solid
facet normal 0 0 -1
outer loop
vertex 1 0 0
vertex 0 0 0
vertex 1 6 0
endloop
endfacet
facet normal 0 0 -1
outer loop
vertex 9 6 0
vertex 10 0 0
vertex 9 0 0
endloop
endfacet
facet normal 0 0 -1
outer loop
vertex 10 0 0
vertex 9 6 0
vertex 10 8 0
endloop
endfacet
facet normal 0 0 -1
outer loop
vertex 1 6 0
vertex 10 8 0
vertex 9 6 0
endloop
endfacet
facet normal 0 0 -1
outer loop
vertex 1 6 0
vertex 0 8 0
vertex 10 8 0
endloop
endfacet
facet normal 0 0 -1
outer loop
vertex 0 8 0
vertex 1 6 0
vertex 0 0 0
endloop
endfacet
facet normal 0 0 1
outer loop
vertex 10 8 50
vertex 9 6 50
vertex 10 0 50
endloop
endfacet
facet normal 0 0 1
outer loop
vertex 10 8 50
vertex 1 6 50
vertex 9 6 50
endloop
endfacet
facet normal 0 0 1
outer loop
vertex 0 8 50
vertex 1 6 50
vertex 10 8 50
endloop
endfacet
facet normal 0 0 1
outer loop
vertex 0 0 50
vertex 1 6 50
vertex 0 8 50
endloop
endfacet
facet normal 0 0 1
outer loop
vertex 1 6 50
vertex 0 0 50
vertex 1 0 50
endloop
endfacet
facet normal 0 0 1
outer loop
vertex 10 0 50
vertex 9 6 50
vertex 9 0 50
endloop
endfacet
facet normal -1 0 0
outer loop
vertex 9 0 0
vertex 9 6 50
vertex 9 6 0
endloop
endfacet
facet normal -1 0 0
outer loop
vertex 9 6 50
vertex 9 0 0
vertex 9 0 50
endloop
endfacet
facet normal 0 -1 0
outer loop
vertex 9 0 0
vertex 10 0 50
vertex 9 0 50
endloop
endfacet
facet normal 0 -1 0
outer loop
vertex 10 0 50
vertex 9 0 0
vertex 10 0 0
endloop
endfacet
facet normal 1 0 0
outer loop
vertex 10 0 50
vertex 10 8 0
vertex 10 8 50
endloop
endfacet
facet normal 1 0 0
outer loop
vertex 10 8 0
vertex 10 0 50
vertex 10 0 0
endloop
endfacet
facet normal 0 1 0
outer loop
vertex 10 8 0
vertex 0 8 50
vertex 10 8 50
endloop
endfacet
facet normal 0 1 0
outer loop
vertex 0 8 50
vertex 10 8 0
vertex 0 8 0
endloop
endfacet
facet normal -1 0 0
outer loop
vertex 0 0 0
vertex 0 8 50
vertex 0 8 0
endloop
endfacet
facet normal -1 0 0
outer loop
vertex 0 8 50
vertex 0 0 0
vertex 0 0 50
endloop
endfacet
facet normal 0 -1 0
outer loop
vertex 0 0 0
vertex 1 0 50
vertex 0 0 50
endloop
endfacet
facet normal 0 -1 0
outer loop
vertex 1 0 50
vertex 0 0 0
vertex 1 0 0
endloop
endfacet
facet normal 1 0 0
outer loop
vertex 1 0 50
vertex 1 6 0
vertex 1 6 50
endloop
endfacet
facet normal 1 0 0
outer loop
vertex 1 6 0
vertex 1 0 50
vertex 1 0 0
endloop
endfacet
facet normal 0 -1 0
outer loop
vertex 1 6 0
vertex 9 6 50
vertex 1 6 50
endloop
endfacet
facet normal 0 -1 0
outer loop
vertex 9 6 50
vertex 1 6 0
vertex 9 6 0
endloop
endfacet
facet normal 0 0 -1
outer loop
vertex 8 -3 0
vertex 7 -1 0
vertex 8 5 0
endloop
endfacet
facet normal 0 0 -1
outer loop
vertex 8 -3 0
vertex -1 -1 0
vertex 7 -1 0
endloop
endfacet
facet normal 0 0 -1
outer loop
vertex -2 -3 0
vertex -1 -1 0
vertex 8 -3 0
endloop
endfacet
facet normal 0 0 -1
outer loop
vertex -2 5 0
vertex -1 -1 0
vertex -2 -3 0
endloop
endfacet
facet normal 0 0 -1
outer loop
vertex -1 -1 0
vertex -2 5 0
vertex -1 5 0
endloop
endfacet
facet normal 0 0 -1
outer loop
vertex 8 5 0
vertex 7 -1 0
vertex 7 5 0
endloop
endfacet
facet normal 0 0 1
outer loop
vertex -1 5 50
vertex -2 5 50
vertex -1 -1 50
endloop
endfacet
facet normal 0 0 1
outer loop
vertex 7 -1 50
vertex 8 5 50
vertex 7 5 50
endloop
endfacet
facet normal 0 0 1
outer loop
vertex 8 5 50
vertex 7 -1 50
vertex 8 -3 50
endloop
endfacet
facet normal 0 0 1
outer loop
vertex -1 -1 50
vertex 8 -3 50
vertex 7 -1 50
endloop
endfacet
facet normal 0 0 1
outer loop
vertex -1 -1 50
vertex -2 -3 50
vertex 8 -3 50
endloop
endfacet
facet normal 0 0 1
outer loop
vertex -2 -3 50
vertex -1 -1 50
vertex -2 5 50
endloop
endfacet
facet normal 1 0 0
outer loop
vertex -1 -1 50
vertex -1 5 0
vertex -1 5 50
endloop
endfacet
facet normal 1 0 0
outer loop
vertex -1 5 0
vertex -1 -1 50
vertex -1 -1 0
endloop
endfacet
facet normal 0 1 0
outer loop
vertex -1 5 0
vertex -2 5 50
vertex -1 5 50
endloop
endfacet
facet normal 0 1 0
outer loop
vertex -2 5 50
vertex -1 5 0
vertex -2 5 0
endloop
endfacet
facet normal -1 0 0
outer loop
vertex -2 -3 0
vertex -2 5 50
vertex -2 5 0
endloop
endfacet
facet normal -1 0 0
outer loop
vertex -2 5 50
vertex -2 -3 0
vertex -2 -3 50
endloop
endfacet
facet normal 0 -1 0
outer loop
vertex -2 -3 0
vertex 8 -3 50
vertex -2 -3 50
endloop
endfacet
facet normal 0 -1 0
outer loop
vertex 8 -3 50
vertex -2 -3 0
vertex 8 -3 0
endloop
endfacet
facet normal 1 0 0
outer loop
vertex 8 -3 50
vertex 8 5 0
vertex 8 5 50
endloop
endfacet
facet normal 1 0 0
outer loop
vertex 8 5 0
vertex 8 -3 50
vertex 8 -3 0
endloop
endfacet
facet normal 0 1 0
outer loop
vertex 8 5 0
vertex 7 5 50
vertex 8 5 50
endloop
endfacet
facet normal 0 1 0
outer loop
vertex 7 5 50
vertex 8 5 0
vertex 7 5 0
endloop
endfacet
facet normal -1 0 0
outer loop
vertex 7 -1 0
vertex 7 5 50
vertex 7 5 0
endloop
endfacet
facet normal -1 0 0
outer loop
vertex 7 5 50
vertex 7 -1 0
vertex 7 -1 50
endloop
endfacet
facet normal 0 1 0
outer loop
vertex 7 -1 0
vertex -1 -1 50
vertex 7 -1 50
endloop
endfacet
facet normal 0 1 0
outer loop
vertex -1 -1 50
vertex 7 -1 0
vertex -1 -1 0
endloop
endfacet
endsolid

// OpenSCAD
color("SteelBlue"){
linear_extrude(height = 50){
    difference(){
        square(size=[10,8]);
        translate([1,0,0])
            square(size=[8,6]);
    }
}}


rotate([0,0,180]){
translate([-8,-5,0]){
linear_extrude(height = 50){
    difference(){
        square(size=[10,8]);
        translate([1,0,0])
            square(size=[8,6]);
    }
}}}
